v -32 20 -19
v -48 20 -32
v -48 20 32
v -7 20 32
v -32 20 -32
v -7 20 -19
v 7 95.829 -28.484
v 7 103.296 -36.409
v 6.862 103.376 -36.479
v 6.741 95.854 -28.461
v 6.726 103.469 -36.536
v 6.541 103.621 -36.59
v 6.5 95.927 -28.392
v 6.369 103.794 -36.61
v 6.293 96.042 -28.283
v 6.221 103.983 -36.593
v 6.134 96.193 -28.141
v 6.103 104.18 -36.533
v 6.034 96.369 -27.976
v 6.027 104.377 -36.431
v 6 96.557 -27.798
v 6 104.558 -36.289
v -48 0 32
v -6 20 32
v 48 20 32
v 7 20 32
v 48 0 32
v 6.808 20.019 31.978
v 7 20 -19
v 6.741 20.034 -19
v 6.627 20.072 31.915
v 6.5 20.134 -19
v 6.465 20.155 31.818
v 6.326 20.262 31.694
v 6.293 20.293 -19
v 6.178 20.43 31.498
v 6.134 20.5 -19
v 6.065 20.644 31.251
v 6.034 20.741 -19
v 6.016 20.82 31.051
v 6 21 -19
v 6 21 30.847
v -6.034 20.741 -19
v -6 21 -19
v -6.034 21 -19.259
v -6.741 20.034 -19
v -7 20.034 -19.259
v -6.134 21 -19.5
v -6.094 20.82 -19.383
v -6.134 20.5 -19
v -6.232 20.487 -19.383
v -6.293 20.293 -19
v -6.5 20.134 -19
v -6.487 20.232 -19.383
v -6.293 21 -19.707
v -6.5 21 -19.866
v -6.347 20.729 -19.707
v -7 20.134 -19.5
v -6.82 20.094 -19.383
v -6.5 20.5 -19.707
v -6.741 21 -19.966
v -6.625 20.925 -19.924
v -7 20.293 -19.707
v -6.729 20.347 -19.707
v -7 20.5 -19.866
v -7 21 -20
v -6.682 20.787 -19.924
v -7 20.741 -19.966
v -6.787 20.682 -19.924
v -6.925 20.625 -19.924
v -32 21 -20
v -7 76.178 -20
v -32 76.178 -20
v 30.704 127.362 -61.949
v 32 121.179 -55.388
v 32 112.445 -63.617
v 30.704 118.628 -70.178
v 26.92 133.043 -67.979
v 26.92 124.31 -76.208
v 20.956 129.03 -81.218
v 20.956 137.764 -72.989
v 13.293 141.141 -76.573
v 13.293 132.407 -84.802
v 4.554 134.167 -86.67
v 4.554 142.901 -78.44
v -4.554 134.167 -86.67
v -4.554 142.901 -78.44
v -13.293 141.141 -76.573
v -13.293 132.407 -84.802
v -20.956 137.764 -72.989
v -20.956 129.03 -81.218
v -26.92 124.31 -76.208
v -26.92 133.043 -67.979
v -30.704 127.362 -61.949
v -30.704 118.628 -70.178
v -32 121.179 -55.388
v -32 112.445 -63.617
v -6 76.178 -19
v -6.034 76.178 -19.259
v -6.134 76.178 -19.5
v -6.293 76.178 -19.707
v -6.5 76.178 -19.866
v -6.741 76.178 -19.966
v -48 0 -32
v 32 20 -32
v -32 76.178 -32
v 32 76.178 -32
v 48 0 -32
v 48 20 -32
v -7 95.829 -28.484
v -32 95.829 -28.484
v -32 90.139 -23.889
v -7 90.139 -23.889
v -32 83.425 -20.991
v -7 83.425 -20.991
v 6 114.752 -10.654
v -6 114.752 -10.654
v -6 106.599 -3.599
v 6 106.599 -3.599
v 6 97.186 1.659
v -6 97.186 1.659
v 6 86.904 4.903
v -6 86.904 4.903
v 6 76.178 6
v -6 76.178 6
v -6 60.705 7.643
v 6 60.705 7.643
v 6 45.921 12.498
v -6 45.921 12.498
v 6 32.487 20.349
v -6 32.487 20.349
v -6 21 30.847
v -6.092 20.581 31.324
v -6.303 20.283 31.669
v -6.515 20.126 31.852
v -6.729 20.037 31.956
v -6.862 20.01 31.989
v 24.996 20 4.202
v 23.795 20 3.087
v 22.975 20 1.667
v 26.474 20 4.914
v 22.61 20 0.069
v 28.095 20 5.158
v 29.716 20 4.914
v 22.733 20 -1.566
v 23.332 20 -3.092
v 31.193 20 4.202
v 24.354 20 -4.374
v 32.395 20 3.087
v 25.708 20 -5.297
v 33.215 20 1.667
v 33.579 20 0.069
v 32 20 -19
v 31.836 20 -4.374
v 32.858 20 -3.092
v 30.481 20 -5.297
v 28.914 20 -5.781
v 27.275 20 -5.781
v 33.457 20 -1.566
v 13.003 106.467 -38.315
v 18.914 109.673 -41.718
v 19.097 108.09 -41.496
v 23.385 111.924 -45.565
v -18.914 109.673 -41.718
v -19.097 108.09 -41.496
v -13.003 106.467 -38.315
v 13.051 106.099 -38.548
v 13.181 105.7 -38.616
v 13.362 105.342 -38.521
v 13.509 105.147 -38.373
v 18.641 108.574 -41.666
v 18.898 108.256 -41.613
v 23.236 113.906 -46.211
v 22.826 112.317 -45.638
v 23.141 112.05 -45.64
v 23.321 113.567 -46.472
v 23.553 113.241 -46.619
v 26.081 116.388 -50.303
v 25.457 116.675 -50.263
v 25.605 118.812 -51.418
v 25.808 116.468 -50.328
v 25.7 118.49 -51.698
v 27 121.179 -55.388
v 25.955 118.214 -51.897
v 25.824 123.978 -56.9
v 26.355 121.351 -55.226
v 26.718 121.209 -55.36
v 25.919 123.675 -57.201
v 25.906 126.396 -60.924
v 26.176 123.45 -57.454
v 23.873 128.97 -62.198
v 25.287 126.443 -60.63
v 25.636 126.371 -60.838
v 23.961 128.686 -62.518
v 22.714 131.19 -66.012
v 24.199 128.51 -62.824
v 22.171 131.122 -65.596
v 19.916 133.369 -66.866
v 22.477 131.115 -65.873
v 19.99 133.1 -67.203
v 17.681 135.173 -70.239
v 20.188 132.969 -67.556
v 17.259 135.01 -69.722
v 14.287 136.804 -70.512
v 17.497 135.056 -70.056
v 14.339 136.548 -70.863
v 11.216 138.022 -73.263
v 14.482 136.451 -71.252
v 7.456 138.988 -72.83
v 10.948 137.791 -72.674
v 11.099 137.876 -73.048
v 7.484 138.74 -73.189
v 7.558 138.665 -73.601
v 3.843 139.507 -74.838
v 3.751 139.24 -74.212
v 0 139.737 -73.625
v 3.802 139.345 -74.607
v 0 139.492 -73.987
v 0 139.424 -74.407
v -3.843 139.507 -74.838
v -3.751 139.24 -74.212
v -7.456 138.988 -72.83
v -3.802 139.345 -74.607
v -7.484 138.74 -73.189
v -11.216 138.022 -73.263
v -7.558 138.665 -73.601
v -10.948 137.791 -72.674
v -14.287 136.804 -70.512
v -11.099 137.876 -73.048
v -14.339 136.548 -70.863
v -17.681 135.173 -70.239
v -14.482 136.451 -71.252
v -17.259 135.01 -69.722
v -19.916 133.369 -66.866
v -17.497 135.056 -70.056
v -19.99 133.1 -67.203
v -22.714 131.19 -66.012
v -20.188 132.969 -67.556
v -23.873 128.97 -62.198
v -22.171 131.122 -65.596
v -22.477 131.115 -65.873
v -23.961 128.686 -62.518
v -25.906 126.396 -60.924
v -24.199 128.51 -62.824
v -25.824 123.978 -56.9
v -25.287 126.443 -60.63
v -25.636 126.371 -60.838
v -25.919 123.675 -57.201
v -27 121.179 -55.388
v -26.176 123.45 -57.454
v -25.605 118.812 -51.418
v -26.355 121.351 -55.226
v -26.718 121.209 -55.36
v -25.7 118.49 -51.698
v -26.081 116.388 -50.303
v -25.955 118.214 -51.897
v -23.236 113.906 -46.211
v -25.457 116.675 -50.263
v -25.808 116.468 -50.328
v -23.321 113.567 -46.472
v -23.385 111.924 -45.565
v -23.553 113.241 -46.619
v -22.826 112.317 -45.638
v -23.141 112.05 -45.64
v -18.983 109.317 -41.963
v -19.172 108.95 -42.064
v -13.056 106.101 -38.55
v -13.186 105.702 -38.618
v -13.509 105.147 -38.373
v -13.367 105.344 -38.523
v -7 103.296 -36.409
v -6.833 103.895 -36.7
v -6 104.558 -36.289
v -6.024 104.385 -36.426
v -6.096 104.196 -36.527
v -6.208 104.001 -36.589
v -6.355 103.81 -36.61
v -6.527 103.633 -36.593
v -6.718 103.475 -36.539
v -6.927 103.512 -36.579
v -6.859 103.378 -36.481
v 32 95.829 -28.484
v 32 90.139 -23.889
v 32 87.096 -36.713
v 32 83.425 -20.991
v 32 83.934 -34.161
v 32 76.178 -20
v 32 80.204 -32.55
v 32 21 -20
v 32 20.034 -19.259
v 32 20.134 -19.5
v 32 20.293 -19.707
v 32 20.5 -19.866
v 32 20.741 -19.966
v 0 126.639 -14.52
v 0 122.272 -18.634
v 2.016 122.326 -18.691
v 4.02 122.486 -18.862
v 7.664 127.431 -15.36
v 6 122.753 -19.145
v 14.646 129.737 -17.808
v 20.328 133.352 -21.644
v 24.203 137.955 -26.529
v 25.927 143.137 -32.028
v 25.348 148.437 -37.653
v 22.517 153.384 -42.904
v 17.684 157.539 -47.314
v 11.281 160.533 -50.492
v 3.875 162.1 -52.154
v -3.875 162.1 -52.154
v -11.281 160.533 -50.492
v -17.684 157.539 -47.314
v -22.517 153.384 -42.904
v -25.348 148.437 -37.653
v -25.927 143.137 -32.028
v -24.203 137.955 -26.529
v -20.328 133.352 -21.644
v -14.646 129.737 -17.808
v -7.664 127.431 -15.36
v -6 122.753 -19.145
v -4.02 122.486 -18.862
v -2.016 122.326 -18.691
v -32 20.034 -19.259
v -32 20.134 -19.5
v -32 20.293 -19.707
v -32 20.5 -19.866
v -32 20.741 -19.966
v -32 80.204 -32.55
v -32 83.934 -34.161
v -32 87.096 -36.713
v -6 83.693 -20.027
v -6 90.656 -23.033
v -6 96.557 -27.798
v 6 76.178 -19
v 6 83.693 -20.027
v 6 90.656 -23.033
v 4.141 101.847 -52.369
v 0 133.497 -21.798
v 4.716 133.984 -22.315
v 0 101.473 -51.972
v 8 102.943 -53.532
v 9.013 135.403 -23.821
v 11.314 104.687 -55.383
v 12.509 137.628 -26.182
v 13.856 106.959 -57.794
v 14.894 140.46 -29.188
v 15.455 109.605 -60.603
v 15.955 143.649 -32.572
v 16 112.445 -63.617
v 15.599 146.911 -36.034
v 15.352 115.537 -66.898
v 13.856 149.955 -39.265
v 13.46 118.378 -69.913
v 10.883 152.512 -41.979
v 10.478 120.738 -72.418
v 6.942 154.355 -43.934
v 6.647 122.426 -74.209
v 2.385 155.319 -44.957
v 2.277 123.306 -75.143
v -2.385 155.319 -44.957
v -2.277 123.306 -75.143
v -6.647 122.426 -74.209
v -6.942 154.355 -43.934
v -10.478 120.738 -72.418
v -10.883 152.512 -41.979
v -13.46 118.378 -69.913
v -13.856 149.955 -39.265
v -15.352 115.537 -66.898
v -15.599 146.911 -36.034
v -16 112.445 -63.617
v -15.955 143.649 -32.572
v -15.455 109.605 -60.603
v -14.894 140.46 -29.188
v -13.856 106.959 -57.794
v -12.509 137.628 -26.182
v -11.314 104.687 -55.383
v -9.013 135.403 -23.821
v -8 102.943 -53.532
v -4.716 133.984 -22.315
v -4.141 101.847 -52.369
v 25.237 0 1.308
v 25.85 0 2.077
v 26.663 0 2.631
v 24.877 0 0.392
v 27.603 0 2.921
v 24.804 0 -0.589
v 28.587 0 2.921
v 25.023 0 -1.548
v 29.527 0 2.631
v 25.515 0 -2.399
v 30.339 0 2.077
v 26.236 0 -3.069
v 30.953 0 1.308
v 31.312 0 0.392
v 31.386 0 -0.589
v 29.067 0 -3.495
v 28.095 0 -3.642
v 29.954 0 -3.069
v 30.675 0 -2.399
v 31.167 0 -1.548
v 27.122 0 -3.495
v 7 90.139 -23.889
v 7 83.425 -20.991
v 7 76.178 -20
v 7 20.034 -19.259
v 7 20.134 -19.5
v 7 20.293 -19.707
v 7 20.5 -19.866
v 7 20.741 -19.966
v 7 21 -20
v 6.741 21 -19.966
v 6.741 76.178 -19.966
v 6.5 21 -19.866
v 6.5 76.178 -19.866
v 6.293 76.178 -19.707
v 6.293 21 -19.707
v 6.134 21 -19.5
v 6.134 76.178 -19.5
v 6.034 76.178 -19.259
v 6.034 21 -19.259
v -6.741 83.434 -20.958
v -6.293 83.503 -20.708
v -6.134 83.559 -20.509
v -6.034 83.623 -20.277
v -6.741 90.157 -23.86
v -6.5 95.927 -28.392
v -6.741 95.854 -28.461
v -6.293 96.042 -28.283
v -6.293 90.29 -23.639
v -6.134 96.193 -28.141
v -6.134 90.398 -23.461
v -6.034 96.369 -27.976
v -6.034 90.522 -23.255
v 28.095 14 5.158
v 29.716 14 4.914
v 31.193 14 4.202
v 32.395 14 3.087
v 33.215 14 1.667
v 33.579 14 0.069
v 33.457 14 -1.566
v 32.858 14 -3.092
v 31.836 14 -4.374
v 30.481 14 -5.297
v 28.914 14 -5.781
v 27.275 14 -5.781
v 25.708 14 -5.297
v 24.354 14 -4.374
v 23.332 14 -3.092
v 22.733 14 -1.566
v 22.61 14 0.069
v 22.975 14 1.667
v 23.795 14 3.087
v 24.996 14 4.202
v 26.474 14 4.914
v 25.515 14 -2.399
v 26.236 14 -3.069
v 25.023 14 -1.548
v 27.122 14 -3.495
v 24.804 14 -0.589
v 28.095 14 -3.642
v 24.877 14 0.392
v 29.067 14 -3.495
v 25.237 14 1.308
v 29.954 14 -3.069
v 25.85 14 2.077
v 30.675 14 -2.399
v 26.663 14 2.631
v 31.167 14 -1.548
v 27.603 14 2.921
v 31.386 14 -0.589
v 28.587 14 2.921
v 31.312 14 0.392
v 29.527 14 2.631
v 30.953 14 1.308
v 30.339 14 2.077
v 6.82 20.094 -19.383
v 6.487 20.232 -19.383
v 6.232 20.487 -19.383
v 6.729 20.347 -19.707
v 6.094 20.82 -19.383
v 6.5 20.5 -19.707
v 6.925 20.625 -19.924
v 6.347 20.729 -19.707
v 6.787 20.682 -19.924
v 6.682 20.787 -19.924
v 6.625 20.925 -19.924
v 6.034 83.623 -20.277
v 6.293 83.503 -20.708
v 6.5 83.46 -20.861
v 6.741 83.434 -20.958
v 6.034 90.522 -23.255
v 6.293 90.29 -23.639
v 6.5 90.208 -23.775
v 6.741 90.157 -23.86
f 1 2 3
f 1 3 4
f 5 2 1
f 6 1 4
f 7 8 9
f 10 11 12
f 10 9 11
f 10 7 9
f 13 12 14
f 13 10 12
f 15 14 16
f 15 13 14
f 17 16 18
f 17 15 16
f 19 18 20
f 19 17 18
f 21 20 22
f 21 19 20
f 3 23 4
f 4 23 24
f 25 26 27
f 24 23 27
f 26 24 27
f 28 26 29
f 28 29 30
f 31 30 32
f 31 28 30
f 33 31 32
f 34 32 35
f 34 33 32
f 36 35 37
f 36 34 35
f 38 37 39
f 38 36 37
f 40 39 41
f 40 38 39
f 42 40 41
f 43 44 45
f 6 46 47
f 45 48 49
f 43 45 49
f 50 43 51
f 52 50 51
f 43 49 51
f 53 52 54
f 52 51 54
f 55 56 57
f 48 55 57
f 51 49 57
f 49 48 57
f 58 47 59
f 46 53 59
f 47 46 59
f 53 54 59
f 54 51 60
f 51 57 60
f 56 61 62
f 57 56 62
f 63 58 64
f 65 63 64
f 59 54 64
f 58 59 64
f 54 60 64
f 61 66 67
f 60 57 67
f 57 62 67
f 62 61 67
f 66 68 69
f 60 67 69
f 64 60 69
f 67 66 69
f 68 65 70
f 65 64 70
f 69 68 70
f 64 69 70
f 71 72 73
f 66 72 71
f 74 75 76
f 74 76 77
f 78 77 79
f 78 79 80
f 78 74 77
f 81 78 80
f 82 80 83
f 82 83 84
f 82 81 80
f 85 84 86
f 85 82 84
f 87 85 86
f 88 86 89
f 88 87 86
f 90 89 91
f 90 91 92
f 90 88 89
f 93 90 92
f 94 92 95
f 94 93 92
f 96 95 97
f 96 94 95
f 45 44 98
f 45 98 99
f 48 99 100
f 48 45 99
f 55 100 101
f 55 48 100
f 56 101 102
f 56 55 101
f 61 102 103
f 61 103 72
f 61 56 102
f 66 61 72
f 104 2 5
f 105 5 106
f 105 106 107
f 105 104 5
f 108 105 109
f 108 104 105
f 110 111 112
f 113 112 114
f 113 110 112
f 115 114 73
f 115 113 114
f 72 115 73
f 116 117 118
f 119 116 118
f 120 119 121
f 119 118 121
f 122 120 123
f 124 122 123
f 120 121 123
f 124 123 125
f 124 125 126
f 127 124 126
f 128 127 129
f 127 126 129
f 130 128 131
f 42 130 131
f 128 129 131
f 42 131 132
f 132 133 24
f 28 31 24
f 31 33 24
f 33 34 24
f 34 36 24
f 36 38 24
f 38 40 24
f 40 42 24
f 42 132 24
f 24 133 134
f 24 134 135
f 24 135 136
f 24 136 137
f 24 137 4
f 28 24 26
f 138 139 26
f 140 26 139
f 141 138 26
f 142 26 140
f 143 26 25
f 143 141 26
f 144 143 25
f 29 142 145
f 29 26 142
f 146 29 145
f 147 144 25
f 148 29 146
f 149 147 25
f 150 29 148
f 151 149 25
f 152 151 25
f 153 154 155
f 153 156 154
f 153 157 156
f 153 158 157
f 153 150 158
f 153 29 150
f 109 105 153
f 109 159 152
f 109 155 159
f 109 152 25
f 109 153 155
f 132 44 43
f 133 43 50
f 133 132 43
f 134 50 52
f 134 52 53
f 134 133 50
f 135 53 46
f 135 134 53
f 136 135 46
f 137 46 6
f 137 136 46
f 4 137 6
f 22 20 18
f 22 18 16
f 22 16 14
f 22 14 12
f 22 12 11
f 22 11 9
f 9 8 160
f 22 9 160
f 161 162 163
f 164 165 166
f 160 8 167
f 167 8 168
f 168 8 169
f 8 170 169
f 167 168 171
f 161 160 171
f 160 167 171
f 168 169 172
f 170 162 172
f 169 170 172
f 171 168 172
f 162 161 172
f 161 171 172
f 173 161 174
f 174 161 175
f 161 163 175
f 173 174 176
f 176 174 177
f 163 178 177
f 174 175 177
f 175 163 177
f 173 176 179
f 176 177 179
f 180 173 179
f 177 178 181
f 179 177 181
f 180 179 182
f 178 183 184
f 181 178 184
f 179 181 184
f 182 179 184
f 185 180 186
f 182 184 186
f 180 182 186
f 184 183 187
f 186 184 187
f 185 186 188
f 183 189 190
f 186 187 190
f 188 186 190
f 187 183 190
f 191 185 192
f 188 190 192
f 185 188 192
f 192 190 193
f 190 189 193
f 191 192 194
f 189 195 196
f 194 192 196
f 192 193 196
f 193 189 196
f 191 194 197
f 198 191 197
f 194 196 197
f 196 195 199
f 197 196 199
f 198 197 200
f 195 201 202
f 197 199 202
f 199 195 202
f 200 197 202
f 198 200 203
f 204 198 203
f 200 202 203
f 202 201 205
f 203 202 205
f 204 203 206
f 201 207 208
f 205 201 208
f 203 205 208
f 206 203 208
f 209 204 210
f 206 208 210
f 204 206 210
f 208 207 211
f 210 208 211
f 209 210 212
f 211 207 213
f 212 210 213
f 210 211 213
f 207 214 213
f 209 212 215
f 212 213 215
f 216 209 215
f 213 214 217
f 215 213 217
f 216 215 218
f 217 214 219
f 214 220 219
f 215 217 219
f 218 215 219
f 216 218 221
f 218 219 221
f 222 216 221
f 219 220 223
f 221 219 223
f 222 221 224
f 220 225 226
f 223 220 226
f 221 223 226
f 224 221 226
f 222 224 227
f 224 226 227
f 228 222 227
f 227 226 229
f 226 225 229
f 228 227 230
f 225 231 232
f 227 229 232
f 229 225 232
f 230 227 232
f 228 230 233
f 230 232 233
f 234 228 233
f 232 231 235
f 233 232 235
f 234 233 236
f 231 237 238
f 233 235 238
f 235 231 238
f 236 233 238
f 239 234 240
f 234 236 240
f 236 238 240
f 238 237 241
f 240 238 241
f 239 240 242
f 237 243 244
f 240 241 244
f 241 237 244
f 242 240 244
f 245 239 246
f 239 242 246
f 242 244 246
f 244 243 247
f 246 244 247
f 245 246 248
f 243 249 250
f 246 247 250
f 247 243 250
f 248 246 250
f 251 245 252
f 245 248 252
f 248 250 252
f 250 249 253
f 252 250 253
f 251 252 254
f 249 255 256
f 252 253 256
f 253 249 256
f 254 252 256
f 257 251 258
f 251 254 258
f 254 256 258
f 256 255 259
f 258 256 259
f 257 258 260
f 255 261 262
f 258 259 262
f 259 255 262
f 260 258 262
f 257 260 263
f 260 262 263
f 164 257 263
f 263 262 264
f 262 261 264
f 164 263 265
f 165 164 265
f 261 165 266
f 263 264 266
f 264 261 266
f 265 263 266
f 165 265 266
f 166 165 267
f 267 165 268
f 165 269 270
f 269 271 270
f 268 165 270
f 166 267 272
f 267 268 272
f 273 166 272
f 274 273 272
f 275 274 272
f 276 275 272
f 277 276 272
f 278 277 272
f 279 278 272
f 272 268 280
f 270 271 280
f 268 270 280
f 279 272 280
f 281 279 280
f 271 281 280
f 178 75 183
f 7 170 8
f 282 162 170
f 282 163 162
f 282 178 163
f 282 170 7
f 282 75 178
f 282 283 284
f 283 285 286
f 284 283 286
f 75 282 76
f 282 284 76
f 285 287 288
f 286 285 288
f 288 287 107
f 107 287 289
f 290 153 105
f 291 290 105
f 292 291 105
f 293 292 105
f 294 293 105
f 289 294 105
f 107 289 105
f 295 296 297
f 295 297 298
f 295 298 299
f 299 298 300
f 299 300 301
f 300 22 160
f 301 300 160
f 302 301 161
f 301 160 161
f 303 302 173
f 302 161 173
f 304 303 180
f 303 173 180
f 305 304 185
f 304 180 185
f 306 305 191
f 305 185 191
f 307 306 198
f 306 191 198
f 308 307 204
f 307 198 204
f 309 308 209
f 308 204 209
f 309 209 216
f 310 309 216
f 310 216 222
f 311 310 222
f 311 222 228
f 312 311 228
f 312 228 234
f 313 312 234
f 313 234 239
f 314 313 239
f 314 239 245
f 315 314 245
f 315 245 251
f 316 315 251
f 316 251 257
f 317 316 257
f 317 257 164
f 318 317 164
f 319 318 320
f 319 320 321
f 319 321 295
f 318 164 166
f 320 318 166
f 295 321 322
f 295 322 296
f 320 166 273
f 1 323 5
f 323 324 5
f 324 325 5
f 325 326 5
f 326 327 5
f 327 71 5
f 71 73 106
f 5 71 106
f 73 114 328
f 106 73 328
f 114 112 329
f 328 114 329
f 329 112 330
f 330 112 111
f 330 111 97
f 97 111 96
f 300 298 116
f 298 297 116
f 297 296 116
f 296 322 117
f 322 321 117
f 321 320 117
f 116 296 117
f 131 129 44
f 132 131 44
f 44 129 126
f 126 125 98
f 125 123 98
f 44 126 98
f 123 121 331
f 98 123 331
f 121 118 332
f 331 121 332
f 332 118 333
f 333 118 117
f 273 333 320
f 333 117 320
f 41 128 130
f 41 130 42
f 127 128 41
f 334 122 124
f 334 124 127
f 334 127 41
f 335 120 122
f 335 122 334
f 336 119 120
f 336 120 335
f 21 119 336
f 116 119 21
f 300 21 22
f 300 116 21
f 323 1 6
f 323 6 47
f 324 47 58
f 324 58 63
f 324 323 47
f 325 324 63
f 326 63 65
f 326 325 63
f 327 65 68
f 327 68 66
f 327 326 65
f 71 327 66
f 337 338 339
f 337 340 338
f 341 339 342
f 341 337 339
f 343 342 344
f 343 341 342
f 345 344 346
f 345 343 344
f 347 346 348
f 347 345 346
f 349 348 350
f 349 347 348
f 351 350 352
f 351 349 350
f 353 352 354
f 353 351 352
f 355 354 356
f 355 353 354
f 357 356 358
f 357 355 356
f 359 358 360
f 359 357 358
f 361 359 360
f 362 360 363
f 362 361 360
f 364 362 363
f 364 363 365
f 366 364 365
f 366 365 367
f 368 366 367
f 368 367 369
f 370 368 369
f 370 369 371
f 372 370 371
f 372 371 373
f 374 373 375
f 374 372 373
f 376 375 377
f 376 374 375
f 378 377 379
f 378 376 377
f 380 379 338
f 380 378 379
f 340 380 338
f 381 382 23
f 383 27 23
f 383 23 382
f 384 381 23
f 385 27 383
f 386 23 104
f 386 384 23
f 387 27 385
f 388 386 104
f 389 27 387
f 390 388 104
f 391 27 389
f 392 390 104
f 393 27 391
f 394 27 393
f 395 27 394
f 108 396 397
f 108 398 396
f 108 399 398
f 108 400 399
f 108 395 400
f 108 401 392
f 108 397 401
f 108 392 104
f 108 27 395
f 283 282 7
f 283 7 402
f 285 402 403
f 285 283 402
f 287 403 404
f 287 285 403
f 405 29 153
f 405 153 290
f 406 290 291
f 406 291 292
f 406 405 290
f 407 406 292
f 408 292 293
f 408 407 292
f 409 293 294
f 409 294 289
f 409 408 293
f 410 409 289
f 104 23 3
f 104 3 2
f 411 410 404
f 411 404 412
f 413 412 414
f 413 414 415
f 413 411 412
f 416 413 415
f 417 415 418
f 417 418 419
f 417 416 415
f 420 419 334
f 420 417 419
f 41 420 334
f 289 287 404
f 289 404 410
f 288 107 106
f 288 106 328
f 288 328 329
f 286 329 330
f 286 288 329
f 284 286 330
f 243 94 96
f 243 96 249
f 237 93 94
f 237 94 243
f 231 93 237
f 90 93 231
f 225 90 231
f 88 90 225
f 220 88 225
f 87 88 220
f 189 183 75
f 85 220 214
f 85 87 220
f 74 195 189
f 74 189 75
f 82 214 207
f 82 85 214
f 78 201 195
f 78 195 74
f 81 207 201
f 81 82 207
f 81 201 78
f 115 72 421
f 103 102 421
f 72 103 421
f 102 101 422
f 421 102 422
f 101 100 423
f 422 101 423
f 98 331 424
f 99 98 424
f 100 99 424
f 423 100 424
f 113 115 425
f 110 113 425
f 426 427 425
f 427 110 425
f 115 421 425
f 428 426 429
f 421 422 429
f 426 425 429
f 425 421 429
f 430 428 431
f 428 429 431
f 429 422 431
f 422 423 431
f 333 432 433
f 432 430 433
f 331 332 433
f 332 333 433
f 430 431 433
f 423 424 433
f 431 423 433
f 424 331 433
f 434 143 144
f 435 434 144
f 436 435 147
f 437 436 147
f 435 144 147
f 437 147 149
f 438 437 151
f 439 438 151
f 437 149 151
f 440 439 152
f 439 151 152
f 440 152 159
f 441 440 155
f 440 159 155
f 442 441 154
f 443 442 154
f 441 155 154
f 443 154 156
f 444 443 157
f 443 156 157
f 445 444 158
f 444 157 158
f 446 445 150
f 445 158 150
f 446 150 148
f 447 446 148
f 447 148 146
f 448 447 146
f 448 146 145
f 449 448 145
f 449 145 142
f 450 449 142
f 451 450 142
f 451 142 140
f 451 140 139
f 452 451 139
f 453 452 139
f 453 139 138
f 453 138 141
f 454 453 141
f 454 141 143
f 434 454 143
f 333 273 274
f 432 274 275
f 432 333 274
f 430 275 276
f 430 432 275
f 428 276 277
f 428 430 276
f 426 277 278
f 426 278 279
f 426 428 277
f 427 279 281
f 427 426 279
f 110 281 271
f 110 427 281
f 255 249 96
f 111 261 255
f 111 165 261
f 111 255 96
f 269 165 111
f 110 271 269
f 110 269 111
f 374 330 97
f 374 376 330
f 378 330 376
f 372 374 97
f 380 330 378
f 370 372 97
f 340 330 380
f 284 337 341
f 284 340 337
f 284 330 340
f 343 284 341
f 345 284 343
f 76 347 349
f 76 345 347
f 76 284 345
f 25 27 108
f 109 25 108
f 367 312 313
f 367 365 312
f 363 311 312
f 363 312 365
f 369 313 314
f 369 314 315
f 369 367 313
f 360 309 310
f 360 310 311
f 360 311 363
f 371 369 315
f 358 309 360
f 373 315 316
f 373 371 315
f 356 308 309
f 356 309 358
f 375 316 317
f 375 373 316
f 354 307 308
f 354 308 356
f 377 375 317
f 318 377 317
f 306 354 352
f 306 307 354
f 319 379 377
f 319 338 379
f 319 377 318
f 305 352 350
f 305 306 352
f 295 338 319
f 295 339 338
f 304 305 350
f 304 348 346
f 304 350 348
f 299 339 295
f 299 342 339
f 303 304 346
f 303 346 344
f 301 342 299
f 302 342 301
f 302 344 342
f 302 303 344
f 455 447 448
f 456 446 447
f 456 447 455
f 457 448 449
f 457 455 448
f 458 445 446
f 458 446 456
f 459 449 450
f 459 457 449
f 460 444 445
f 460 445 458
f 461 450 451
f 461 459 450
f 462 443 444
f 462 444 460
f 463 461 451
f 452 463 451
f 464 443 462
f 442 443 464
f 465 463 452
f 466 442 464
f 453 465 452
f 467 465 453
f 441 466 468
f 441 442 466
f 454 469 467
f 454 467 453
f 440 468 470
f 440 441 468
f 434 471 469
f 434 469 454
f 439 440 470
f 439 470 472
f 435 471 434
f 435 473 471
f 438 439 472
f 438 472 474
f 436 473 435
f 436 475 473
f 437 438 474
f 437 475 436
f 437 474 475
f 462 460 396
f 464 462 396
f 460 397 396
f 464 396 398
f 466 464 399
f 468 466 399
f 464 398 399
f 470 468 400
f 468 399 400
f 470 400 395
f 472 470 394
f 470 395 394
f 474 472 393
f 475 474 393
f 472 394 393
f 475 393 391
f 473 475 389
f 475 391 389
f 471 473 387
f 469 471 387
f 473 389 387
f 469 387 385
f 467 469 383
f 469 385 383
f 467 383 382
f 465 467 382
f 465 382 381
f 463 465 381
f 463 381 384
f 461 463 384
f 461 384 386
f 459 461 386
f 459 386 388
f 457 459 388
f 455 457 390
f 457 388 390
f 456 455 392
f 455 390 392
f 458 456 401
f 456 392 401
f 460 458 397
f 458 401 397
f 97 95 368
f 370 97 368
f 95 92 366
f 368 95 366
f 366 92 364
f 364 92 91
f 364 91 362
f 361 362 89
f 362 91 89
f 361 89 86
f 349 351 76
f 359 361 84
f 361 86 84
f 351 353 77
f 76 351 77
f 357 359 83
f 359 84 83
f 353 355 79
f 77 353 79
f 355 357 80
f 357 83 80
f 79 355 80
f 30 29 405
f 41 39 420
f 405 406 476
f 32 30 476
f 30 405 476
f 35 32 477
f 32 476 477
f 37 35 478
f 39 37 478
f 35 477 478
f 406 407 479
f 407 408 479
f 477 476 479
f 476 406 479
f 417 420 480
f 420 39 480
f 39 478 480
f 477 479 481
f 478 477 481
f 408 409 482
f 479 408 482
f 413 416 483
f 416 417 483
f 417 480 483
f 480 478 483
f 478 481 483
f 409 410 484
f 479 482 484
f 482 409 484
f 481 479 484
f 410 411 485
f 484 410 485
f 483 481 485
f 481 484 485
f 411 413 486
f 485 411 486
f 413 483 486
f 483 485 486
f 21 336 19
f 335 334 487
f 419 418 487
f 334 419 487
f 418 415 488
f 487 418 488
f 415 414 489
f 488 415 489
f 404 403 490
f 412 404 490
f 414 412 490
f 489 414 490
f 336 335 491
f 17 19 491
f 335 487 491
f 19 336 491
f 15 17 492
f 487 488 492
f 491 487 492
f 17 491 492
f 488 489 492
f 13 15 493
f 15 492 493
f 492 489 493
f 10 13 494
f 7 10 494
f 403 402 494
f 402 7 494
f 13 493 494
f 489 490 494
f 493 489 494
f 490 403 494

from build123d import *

# Parameters (mm, degrees)
SKETCH4_W                      = 96
SKETCH4_H                      = 64
BOSS_EXTRUDE1_DEPTH            = 20
BOSS_EXTRUDE2_DEPTH            = 32
BOSS_EXTRUDE3_DEPTH            = 12
SKETCH7_R                      = 26
SKETCH7_R_2                    = 16
BOSS_EXTRUDE4_DEPTH            = 32
CUT_EXTRUDE1_START             = -32
SKETCH8_R                      = 16
CUT_EXTRUDE1_DEPTH             = 32
RIB1_START                     = -6
RIB1_DEPTH                     = 12
FILLET1_R                      = 1
CBORE_FOR_M6_SHCS2_D           = 6.6
CBORE_FOR_M6_SHCS2_CBORE_D     = 11
CBORE_FOR_M6_SHCS2_CBORE_DEPTH = 6


with BuildPart() as part:
    # Sketch4 → Boss-Extrude1 (new body)
    with BuildSketch(Plane(origin=(0, 0, 0), x_dir=(1, 0, 0), z_dir=(0, 1, 0))):
        Rectangle(SKETCH4_W, SKETCH4_H)
    extrude(amount=BOSS_EXTRUDE1_DEPTH)

    # Sketch5 → Boss-Extrude2 (add, symmetric)
    with BuildSketch(Plane(origin=(0, 0, 0), x_dir=(0, 0, -1), z_dir=(1, 0, 0))):
        with BuildLine():
            Line((20, 0), (32, 0))
            Line((32, 0), (32, 76.178360588))
            ThreePointArc((32, 76.178360588), (33.228648741, 82.123937475), (36.713317934, 87.095510953))
            Line((36.713317934, 87.095510953), (63.616851895, 112.445358766))
            Line((63.616851895, 112.445358766), (55.387506243, 121.179079058))
            Line((55.387506243, 121.179079058), (28.483972282, 95.829231245))
            ThreePointArc((28.483972282, 95.829231245), (22.211567734, 86.880398983), (20, 76.178360588))
            Line((20, 76.178360588), (20, 0))
        make_face()
    extrude(amount=BOSS_EXTRUDE2_DEPTH, both=True)

    # Sketch6 → Boss-Extrude3 (add)
    with BuildSketch(Plane(origin=(0, 36.544630029, 34.434168053), x_dir=(1, 0, 0), z_dir=(0, 0.7278100243036815, 0.6857788043699474))):
        with BuildLine():
            Line((-32, 123.413626216), (32, 123.413626216))
            ThreePointArc((32, 123.413626216), (0, 155.413626216), (-32, 123.413626216))
        make_face()
    extrude(amount=-BOSS_EXTRUDE3_DEPTH)

    # Sketch7 → Boss-Extrude4 (add)
    with BuildSketch(Plane(origin=(0, 36.544630029, 34.434168053), x_dir=(1, 0, 0), z_dir=(0, 0.7278100243036815, 0.6857788043699474))):
        with Locations(Location((0, 123.413626216, 0), (0, 0, 270))):
            Circle(SKETCH7_R)
        with Locations(Location((0, 123.413626216, 0), (0, 0, 270))):
            Circle(SKETCH7_R_2, mode=Mode.SUBTRACT)
    extrude(amount=BOSS_EXTRUDE4_DEPTH)

    # Sketch8 → Cut-Extrude1 (cut)
    with BuildSketch(Plane(origin=(0, 36.544630029, 34.434168053), x_dir=(1, 0, 0), z_dir=(0, 0.7278100243036815, 0.6857788043699474)).offset(CUT_EXTRUDE1_START)):
        with Locations(Location((0, 123.413626216, 0), (0, 0, 270))):
            Circle(SKETCH8_R)
    extrude(amount=CUT_EXTRUDE1_DEPTH, mode=Mode.SUBTRACT)

    # Rib1: read off the stored shape, not the designer's step
    # Rib1 outline → Rib1 (add)
    with BuildSketch(Plane(origin=(0, 0, 0), x_dir=(0, 0, -1), z_dir=(1, 0, 0)).offset(RIB1_START)):
        with BuildLine():
            Line((28.483972282, 95.829231245), (36.975207197, 103.830095115))
            Line((36.975207197, 103.830095115), (19.144958284, 122.753155747))
            Line((19.144958284, 122.753155747), (10.653723368, 114.752291877))
            ThreePointArc((10.653723368, 114.752291877), (-1.658774448, 97.186065586), (-6, 76.178360588))
            ThreePointArc((-6, 76.178360588), (-12.815134364, 45.226752398), (-32, 20))
            Line((-32, 20), (20, 20))
            Line((20, 20), (20, 76.178360588))
            ThreePointArc((20, 76.178360588), (22.211567734, 86.880398983), (28.483972282, 95.829231245))
        make_face()
    extrude(amount=RIB1_DEPTH)

    # Fillet1
    # the kernel refuses this fillet: 1 mm, written as the material it adds along each edge
    with BuildSketch(Plane(origin=(7, 21, -19), x_dir=(-1, 0, 0), z_dir=(0, 0, -1))) as fillet1_piece_1_section:
        Polygon((0, 0), (FILLET1_R * 1.02, 0), (FILLET1_R * 1.02, -FILLET1_R * 1.02), (0, -FILLET1_R * 1.02), align=None)
    fillet1_piece_1 = extrude(amount=FILLET1_R * 1.02, mode=Mode.PRIVATE)
    fillet1_piece_1 = fillet1_piece_1 - Plane(origin=(7, 21, -19), x_dir=(0.7071067811865475, 0.7071067811865475, 0), z_dir=(0, 0, -1)) * Sphere(FILLET1_R, mode=Mode.PRIVATE)
    add(fillet1_piece_1)
    with BuildSketch(Plane(origin=(-7, 21, -19), x_dir=(1, 0, 0), z_dir=(0, 0, -1))) as fillet1_piece_2_section:
        Polygon((0, 0), (FILLET1_R * 1.02, 0), (FILLET1_R * 1.02, FILLET1_R * 1.02), (0, FILLET1_R * 1.02), align=None)
    fillet1_piece_2 = extrude(amount=FILLET1_R * 1.02, mode=Mode.PRIVATE)
    fillet1_piece_2 = fillet1_piece_2 - Plane(origin=(-7, 21, -19), x_dir=(-0.7071067811865475, 0.7071067811865475, 0), z_dir=(0, 0, -1)) * Sphere(FILLET1_R, mode=Mode.PRIVATE)
    add(fillet1_piece_2)
    with BuildSketch(Plane(origin=(7, 20, -20), x_dir=(0, 0, 1), z_dir=(1, 0, 0)), Plane(origin=(-32, 20, -20), x_dir=(0, 0, 1), z_dir=(1, 0, 0))) as fillet1_piece_3:
        with BuildLine():
            CenterArc((FILLET1_R, -FILLET1_R), FILLET1_R, 90, 90)
            Line((0, -FILLET1_R), (0, 0))
            Line((0, 0), (FILLET1_R, 0))
        make_face()
    extrude(amount=25)
    with BuildSketch(Plane(origin=(0, 121.179079058, -55.387506243), x_dir=(0.13576209912112866, -0.6794294979898851, 0.7210715704445971), z_dir=(-0.990741465995153, -0.09310277001404191, 0.09880901666086746))) as fillet1_piece_4:
        with BuildLine():
            CenterArc((26 + FILLET1_R, FILLET1_R), FILLET1_R, 180, 90)
            Line((26, FILLET1_R), (26, 0))
            Line((26, 0), (26 + FILLET1_R, 0))
        make_face()
    revolve(axis=Axis((0, 121.179079058, -55.387506243), (0, 0.7278100243036815, 0.6857788043699474)), revolution_arc=344.394618628)
    with BuildSketch(Plane(origin=(6, 21, -20), x_dir=(0, 0, 1), z_dir=(0, 1, 0)), Plane(origin=(-6, 21, -20), x_dir=(-1, 0, 0), z_dir=(0, 1, 0))) as fillet1_piece_5:
        with BuildLine():
            CenterArc((FILLET1_R, FILLET1_R), FILLET1_R, 180, 90)
            Line((0, FILLET1_R), (0, 0))
            Line((0, 0), (FILLET1_R, 0))
        make_face()
    extrude(amount=55.178360588)
    with BuildSketch(Plane(origin=(6, 76.178360589, -47.000000001), x_dir=(0, -1.928886679962007e-11, 1.0), z_dir=(0, -1.0, -1.928886679962007e-11))) as fillet1_piece_6:
        with BuildLine():
            CenterArc((27.000000001 + FILLET1_R, -FILLET1_R), FILLET1_R, 90, 90)
            Line((27.000000001, -FILLET1_R), (27.000000001, 0))
            Line((27.000000001, 0), (27.000000001 + FILLET1_R, 0))
        make_face()
    revolve(axis=Axis((6, 76.178360589, -47.000000001), (-1, 0, 0)), revolution_arc=46.703113482)
    with BuildSketch(Plane(origin=(6, 95.829231245, -28.483972282), x_dir=(0, 0.7278100243012071, 0.6857788043725734), z_dir=(0, 0.6857788043725734, -0.7278100243012071)), Plane(origin=(-6, 95.829231245, -28.483972282), x_dir=(-1.0, -2.1788147308559408e-10, -2.0529876082846627e-10), z_dir=(0, 0.6857788043725734, -0.7278100243012071))) as fillet1_piece_7:
        with BuildLine():
            CenterArc((FILLET1_R, FILLET1_R), FILLET1_R, 180, 90)
            Line((-FILLET1_R * 2.99381074515e-10, FILLET1_R), (0, 0))
            Line((0, 0), (FILLET1_R, 0))
        make_face()
    extrude(amount=14.166828749)
    with BuildSketch(Plane(origin=(6, 20, 34.5), x_dir=(1, 0, 0), z_dir=(0, 0, -1))) as fillet1_piece_8_section:
        with BuildLine():
            CenterArc((FILLET1_R, -FILLET1_R), FILLET1_R, 90, 90)
            Line((0, -FILLET1_R), (0, 0))
            Line((0, 0), (FILLET1_R, 0))
        make_face()
    fillet1_piece_8 = extrude(amount=53.5, mode=Mode.PRIVATE)
    fillet1_piece_8 = fillet1_piece_8 - Plane(origin=(6, 76.178360589, 79.692465356), x_dir=(0, -1.8148557691731866e-11, -1.0), z_dir=(-1, 0, 0)) * Cylinder(73.692465356, 111, mode=Mode.PRIVATE)
    add(fillet1_piece_8)
    with BuildSketch(Plane(origin=(-6, 20, 34.5), x_dir=(-1, 0, 0), z_dir=(0, 0, -1))) as fillet1_piece_9_section:
        with BuildLine():
            CenterArc((FILLET1_R, FILLET1_R), FILLET1_R, 180, 90)
            Line((0, FILLET1_R), (0, 0))
            Line((0, 0), (FILLET1_R, 0))
        make_face()
    fillet1_piece_9 = extrude(amount=53.5, mode=Mode.PRIVATE)
    fillet1_piece_9 = fillet1_piece_9 - Plane(origin=(-6, 76.178360589, 79.692465356), x_dir=(0, -1.8148557691731866e-11, -1.0), z_dir=(-1, 0, 0)) * Cylinder(73.692465356, 111, mode=Mode.PRIVATE)
    add(fillet1_piece_9)
    with BuildSketch(Plane(origin=(-6, 76.178360589, -47.000000001), x_dir=(0, -1.928886679962007e-11, 1.0), z_dir=(0, -1.0, -1.928886679962007e-11))) as fillet1_piece_10:
        with BuildLine():
            CenterArc((27.000000001 + FILLET1_R, FILLET1_R), FILLET1_R, 180, 90)
            Line((27.000000001 + FILLET1_R, 0), (27.000000001, 0))
            Line((27.000000001, 0), (27.000000001, FILLET1_R))
        make_face()
    revolve(axis=Axis((-6, 76.178360589, -47.000000001), (-1, 0, 0)), revolution_arc=46.703113482)

    # CBORE for M6 SHCS2 (through all)
    with Locations(Plane(origin=(28.094759236, 20, -0.341970782), x_dir=(0, 0, 1), z_dir=(0, 1, 0))):
        with Locations((0, 0)):
            CounterBoreHole(CBORE_FOR_M6_SHCS2_D / 2, CBORE_FOR_M6_SHCS2_CBORE_D / 2, CBORE_FOR_M6_SHCS2_CBORE_DEPTH)


solid = part.part
